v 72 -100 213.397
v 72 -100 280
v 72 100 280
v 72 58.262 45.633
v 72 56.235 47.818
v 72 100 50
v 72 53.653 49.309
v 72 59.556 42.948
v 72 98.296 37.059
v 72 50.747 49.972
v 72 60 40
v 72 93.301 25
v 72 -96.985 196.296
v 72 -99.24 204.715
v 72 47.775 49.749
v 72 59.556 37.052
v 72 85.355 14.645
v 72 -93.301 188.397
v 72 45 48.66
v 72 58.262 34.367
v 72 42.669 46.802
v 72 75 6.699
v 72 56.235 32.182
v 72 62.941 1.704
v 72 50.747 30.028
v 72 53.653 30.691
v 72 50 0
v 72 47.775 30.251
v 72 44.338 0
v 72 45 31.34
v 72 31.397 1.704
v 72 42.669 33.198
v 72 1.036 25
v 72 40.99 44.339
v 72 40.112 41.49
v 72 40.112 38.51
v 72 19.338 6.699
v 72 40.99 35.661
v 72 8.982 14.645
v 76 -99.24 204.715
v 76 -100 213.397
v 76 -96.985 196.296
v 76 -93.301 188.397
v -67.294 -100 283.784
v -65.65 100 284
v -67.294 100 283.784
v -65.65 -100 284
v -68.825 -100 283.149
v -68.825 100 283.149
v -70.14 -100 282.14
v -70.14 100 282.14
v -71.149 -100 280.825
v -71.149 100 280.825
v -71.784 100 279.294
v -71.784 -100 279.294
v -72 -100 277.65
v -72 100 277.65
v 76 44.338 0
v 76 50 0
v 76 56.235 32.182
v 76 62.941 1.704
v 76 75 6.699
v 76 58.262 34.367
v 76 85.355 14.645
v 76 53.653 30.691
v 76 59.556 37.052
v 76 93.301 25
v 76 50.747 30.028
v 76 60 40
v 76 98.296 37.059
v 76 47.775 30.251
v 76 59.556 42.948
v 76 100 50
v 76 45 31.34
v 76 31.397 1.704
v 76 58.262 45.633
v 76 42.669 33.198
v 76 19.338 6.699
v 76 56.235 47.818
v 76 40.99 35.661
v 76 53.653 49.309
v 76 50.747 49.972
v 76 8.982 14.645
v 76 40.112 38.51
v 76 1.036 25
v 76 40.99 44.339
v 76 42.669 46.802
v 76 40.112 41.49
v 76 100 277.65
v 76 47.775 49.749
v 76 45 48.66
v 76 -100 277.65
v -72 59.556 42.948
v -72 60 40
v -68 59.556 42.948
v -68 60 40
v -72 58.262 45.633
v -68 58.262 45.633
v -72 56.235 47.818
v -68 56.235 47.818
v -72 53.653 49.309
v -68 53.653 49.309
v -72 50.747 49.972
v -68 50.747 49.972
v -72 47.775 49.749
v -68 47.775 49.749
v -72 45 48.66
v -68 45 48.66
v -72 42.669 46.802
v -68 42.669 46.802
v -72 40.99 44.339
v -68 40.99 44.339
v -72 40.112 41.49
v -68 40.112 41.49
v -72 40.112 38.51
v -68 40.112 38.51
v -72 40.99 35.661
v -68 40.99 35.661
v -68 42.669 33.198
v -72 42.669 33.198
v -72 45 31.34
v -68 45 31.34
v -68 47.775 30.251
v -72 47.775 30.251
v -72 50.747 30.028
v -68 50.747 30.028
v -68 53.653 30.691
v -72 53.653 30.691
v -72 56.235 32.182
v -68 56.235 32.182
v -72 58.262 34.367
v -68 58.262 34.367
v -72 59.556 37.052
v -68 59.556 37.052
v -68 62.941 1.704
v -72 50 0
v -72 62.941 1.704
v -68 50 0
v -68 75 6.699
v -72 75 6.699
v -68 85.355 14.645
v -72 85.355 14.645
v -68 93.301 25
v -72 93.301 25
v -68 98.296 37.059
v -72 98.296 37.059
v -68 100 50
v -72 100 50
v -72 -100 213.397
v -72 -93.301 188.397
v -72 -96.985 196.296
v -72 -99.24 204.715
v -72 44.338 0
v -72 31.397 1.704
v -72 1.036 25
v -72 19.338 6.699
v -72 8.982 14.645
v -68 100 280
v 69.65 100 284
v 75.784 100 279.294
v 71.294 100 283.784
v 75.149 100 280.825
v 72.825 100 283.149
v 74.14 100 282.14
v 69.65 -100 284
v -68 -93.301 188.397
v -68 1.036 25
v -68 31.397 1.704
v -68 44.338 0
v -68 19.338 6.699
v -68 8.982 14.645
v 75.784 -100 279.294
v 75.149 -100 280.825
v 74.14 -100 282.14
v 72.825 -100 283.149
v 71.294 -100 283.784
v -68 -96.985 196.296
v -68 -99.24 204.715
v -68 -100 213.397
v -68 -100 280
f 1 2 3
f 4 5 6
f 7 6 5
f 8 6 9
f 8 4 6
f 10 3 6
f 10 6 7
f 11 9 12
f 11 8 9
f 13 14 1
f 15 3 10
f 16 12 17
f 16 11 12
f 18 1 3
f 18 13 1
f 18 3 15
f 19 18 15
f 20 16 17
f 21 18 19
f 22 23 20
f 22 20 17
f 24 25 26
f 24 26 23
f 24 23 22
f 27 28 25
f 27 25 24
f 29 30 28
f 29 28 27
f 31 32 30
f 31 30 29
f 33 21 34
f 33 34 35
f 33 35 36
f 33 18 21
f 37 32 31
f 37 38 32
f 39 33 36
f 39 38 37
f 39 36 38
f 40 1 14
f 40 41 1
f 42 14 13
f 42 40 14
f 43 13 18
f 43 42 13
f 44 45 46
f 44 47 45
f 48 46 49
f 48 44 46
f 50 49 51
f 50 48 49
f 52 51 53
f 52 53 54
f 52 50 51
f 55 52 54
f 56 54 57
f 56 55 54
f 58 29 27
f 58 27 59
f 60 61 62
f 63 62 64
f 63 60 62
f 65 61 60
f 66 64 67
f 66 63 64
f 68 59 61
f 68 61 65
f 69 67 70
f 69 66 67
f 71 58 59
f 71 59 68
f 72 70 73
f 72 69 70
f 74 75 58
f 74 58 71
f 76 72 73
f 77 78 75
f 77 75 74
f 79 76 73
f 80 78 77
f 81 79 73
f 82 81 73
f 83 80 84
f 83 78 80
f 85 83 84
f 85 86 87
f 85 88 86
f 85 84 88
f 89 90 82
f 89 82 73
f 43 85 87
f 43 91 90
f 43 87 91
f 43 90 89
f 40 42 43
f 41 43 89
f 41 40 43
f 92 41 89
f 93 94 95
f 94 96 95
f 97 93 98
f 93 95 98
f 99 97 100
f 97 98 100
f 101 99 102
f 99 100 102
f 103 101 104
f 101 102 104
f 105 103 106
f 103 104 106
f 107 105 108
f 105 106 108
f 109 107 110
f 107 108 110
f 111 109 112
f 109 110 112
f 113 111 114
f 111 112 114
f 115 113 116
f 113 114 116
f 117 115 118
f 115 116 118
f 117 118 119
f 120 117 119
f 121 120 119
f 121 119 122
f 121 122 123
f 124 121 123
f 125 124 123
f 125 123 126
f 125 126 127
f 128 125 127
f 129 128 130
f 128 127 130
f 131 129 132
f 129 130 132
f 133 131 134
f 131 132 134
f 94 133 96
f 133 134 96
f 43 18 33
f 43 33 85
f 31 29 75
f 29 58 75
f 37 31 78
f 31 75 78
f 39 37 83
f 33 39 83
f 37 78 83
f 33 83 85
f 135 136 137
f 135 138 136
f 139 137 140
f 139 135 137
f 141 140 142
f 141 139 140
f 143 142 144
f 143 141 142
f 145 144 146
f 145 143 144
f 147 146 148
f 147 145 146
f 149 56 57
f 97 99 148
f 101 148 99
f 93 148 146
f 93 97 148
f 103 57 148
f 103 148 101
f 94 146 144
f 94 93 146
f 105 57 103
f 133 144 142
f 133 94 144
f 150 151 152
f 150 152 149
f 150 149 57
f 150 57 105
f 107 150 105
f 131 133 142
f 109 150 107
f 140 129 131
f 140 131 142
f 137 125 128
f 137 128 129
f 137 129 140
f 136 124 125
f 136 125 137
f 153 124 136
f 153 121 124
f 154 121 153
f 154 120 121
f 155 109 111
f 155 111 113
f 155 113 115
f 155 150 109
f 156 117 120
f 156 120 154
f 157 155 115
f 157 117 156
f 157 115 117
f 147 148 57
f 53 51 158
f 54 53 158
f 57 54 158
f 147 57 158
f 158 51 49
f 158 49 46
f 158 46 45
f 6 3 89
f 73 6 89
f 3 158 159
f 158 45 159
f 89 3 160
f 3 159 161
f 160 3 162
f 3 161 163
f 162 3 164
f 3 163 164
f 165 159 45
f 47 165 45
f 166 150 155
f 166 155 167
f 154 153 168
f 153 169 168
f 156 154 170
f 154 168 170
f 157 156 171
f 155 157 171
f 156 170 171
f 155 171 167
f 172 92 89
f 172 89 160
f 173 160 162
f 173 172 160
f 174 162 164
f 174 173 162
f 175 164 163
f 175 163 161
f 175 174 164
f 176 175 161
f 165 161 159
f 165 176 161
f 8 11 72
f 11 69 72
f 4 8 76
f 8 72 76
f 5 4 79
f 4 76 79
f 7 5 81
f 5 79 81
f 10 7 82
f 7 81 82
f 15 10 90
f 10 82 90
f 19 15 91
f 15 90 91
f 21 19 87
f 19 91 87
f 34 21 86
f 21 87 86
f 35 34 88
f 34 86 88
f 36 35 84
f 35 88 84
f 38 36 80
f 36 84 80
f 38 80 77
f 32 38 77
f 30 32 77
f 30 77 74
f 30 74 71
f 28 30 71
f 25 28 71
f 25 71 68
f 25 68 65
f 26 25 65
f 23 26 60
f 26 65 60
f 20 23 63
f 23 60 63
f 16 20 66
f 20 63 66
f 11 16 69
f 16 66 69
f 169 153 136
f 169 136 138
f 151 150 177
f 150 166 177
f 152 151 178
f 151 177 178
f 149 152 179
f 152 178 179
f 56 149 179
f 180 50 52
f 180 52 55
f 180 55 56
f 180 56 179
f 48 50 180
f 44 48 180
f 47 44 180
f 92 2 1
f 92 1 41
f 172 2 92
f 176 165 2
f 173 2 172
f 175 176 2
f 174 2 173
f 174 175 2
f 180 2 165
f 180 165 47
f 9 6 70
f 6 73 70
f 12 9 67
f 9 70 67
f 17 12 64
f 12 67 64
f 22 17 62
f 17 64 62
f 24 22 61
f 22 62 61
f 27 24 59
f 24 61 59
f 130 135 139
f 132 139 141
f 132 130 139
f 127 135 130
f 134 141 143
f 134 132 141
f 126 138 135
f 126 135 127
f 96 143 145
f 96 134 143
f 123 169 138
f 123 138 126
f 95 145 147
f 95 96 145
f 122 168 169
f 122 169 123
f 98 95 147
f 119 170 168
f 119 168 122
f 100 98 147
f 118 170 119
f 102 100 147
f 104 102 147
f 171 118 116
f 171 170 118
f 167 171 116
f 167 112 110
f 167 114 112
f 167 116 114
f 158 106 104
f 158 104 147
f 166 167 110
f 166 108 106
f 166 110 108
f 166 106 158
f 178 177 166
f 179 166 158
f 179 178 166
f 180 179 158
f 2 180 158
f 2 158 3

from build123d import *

# Parameters (mm, degrees)
F1_DEPTH = 100
F2_SIZE2 = 115.4700538379
F2_SIZE  = 200
F3_R     = 50
F4_R     = 10
F5_DEPTH = 100


with BuildPart() as f1:
    # F0 (on Front) → F1 (new body, symmetric)
    with BuildSketch(Plane.XZ):
        with BuildLine():
            Line((-72, 277.65), (-72, 0))
            Line((-72, 0), (-68, 0))
            Line((-68, 0), (-68, 280))
            Line((-68, 280), (72, 280))
            Line((72, 280), (72, 0))
            Line((72, 0), (76, 0))
            Line((76, 0), (76, 277.65))
            ThreePointArc((76, 277.65), (74.1401280605, 282.1401280605), (69.65, 284))
            Line((69.65, 284), (-65.65, 284))
            ThreePointArc((-65.65, 284), (-70.1401280605, 282.1401280605), (-72, 277.65))
        make_face()
    extrude(amount=F1_DEPTH, both=True)

    # F2
    f2_edges = [f1.edges().sort_by_distance(p)[0] for p in [
        (74, -100, 0),
        (-70, -100, 0),
    ]]
    f2_side = f1.faces().sort_by_distance((-68.797501, -100, 138.825))[0]
    chamfer(f2_edges, length=F2_SIZE, length2=F2_SIZE2, reference=f2_side)

    # F3
    f3_edges = [f1.edges().sort_by_distance(p)[0] for p in [
        (74, -100, 200),
        (-70, -100, 200),
        (74, 15.470054, 0),
        (-70, 15.470054, 0),
        (-70, 100, 0),
        (74, 100, 0),
    ]]
    fillet(f3_edges, radius=F3_R)

    # F4 (on Right) → F5 (cut, symmetric)
    with BuildSketch(Plane.YZ):
        with Locations((50, 40)):
            Circle(F4_R)
    extrude(amount=F5_DEPTH, both=True, mode=Mode.SUBTRACT)


solid = f1.part
